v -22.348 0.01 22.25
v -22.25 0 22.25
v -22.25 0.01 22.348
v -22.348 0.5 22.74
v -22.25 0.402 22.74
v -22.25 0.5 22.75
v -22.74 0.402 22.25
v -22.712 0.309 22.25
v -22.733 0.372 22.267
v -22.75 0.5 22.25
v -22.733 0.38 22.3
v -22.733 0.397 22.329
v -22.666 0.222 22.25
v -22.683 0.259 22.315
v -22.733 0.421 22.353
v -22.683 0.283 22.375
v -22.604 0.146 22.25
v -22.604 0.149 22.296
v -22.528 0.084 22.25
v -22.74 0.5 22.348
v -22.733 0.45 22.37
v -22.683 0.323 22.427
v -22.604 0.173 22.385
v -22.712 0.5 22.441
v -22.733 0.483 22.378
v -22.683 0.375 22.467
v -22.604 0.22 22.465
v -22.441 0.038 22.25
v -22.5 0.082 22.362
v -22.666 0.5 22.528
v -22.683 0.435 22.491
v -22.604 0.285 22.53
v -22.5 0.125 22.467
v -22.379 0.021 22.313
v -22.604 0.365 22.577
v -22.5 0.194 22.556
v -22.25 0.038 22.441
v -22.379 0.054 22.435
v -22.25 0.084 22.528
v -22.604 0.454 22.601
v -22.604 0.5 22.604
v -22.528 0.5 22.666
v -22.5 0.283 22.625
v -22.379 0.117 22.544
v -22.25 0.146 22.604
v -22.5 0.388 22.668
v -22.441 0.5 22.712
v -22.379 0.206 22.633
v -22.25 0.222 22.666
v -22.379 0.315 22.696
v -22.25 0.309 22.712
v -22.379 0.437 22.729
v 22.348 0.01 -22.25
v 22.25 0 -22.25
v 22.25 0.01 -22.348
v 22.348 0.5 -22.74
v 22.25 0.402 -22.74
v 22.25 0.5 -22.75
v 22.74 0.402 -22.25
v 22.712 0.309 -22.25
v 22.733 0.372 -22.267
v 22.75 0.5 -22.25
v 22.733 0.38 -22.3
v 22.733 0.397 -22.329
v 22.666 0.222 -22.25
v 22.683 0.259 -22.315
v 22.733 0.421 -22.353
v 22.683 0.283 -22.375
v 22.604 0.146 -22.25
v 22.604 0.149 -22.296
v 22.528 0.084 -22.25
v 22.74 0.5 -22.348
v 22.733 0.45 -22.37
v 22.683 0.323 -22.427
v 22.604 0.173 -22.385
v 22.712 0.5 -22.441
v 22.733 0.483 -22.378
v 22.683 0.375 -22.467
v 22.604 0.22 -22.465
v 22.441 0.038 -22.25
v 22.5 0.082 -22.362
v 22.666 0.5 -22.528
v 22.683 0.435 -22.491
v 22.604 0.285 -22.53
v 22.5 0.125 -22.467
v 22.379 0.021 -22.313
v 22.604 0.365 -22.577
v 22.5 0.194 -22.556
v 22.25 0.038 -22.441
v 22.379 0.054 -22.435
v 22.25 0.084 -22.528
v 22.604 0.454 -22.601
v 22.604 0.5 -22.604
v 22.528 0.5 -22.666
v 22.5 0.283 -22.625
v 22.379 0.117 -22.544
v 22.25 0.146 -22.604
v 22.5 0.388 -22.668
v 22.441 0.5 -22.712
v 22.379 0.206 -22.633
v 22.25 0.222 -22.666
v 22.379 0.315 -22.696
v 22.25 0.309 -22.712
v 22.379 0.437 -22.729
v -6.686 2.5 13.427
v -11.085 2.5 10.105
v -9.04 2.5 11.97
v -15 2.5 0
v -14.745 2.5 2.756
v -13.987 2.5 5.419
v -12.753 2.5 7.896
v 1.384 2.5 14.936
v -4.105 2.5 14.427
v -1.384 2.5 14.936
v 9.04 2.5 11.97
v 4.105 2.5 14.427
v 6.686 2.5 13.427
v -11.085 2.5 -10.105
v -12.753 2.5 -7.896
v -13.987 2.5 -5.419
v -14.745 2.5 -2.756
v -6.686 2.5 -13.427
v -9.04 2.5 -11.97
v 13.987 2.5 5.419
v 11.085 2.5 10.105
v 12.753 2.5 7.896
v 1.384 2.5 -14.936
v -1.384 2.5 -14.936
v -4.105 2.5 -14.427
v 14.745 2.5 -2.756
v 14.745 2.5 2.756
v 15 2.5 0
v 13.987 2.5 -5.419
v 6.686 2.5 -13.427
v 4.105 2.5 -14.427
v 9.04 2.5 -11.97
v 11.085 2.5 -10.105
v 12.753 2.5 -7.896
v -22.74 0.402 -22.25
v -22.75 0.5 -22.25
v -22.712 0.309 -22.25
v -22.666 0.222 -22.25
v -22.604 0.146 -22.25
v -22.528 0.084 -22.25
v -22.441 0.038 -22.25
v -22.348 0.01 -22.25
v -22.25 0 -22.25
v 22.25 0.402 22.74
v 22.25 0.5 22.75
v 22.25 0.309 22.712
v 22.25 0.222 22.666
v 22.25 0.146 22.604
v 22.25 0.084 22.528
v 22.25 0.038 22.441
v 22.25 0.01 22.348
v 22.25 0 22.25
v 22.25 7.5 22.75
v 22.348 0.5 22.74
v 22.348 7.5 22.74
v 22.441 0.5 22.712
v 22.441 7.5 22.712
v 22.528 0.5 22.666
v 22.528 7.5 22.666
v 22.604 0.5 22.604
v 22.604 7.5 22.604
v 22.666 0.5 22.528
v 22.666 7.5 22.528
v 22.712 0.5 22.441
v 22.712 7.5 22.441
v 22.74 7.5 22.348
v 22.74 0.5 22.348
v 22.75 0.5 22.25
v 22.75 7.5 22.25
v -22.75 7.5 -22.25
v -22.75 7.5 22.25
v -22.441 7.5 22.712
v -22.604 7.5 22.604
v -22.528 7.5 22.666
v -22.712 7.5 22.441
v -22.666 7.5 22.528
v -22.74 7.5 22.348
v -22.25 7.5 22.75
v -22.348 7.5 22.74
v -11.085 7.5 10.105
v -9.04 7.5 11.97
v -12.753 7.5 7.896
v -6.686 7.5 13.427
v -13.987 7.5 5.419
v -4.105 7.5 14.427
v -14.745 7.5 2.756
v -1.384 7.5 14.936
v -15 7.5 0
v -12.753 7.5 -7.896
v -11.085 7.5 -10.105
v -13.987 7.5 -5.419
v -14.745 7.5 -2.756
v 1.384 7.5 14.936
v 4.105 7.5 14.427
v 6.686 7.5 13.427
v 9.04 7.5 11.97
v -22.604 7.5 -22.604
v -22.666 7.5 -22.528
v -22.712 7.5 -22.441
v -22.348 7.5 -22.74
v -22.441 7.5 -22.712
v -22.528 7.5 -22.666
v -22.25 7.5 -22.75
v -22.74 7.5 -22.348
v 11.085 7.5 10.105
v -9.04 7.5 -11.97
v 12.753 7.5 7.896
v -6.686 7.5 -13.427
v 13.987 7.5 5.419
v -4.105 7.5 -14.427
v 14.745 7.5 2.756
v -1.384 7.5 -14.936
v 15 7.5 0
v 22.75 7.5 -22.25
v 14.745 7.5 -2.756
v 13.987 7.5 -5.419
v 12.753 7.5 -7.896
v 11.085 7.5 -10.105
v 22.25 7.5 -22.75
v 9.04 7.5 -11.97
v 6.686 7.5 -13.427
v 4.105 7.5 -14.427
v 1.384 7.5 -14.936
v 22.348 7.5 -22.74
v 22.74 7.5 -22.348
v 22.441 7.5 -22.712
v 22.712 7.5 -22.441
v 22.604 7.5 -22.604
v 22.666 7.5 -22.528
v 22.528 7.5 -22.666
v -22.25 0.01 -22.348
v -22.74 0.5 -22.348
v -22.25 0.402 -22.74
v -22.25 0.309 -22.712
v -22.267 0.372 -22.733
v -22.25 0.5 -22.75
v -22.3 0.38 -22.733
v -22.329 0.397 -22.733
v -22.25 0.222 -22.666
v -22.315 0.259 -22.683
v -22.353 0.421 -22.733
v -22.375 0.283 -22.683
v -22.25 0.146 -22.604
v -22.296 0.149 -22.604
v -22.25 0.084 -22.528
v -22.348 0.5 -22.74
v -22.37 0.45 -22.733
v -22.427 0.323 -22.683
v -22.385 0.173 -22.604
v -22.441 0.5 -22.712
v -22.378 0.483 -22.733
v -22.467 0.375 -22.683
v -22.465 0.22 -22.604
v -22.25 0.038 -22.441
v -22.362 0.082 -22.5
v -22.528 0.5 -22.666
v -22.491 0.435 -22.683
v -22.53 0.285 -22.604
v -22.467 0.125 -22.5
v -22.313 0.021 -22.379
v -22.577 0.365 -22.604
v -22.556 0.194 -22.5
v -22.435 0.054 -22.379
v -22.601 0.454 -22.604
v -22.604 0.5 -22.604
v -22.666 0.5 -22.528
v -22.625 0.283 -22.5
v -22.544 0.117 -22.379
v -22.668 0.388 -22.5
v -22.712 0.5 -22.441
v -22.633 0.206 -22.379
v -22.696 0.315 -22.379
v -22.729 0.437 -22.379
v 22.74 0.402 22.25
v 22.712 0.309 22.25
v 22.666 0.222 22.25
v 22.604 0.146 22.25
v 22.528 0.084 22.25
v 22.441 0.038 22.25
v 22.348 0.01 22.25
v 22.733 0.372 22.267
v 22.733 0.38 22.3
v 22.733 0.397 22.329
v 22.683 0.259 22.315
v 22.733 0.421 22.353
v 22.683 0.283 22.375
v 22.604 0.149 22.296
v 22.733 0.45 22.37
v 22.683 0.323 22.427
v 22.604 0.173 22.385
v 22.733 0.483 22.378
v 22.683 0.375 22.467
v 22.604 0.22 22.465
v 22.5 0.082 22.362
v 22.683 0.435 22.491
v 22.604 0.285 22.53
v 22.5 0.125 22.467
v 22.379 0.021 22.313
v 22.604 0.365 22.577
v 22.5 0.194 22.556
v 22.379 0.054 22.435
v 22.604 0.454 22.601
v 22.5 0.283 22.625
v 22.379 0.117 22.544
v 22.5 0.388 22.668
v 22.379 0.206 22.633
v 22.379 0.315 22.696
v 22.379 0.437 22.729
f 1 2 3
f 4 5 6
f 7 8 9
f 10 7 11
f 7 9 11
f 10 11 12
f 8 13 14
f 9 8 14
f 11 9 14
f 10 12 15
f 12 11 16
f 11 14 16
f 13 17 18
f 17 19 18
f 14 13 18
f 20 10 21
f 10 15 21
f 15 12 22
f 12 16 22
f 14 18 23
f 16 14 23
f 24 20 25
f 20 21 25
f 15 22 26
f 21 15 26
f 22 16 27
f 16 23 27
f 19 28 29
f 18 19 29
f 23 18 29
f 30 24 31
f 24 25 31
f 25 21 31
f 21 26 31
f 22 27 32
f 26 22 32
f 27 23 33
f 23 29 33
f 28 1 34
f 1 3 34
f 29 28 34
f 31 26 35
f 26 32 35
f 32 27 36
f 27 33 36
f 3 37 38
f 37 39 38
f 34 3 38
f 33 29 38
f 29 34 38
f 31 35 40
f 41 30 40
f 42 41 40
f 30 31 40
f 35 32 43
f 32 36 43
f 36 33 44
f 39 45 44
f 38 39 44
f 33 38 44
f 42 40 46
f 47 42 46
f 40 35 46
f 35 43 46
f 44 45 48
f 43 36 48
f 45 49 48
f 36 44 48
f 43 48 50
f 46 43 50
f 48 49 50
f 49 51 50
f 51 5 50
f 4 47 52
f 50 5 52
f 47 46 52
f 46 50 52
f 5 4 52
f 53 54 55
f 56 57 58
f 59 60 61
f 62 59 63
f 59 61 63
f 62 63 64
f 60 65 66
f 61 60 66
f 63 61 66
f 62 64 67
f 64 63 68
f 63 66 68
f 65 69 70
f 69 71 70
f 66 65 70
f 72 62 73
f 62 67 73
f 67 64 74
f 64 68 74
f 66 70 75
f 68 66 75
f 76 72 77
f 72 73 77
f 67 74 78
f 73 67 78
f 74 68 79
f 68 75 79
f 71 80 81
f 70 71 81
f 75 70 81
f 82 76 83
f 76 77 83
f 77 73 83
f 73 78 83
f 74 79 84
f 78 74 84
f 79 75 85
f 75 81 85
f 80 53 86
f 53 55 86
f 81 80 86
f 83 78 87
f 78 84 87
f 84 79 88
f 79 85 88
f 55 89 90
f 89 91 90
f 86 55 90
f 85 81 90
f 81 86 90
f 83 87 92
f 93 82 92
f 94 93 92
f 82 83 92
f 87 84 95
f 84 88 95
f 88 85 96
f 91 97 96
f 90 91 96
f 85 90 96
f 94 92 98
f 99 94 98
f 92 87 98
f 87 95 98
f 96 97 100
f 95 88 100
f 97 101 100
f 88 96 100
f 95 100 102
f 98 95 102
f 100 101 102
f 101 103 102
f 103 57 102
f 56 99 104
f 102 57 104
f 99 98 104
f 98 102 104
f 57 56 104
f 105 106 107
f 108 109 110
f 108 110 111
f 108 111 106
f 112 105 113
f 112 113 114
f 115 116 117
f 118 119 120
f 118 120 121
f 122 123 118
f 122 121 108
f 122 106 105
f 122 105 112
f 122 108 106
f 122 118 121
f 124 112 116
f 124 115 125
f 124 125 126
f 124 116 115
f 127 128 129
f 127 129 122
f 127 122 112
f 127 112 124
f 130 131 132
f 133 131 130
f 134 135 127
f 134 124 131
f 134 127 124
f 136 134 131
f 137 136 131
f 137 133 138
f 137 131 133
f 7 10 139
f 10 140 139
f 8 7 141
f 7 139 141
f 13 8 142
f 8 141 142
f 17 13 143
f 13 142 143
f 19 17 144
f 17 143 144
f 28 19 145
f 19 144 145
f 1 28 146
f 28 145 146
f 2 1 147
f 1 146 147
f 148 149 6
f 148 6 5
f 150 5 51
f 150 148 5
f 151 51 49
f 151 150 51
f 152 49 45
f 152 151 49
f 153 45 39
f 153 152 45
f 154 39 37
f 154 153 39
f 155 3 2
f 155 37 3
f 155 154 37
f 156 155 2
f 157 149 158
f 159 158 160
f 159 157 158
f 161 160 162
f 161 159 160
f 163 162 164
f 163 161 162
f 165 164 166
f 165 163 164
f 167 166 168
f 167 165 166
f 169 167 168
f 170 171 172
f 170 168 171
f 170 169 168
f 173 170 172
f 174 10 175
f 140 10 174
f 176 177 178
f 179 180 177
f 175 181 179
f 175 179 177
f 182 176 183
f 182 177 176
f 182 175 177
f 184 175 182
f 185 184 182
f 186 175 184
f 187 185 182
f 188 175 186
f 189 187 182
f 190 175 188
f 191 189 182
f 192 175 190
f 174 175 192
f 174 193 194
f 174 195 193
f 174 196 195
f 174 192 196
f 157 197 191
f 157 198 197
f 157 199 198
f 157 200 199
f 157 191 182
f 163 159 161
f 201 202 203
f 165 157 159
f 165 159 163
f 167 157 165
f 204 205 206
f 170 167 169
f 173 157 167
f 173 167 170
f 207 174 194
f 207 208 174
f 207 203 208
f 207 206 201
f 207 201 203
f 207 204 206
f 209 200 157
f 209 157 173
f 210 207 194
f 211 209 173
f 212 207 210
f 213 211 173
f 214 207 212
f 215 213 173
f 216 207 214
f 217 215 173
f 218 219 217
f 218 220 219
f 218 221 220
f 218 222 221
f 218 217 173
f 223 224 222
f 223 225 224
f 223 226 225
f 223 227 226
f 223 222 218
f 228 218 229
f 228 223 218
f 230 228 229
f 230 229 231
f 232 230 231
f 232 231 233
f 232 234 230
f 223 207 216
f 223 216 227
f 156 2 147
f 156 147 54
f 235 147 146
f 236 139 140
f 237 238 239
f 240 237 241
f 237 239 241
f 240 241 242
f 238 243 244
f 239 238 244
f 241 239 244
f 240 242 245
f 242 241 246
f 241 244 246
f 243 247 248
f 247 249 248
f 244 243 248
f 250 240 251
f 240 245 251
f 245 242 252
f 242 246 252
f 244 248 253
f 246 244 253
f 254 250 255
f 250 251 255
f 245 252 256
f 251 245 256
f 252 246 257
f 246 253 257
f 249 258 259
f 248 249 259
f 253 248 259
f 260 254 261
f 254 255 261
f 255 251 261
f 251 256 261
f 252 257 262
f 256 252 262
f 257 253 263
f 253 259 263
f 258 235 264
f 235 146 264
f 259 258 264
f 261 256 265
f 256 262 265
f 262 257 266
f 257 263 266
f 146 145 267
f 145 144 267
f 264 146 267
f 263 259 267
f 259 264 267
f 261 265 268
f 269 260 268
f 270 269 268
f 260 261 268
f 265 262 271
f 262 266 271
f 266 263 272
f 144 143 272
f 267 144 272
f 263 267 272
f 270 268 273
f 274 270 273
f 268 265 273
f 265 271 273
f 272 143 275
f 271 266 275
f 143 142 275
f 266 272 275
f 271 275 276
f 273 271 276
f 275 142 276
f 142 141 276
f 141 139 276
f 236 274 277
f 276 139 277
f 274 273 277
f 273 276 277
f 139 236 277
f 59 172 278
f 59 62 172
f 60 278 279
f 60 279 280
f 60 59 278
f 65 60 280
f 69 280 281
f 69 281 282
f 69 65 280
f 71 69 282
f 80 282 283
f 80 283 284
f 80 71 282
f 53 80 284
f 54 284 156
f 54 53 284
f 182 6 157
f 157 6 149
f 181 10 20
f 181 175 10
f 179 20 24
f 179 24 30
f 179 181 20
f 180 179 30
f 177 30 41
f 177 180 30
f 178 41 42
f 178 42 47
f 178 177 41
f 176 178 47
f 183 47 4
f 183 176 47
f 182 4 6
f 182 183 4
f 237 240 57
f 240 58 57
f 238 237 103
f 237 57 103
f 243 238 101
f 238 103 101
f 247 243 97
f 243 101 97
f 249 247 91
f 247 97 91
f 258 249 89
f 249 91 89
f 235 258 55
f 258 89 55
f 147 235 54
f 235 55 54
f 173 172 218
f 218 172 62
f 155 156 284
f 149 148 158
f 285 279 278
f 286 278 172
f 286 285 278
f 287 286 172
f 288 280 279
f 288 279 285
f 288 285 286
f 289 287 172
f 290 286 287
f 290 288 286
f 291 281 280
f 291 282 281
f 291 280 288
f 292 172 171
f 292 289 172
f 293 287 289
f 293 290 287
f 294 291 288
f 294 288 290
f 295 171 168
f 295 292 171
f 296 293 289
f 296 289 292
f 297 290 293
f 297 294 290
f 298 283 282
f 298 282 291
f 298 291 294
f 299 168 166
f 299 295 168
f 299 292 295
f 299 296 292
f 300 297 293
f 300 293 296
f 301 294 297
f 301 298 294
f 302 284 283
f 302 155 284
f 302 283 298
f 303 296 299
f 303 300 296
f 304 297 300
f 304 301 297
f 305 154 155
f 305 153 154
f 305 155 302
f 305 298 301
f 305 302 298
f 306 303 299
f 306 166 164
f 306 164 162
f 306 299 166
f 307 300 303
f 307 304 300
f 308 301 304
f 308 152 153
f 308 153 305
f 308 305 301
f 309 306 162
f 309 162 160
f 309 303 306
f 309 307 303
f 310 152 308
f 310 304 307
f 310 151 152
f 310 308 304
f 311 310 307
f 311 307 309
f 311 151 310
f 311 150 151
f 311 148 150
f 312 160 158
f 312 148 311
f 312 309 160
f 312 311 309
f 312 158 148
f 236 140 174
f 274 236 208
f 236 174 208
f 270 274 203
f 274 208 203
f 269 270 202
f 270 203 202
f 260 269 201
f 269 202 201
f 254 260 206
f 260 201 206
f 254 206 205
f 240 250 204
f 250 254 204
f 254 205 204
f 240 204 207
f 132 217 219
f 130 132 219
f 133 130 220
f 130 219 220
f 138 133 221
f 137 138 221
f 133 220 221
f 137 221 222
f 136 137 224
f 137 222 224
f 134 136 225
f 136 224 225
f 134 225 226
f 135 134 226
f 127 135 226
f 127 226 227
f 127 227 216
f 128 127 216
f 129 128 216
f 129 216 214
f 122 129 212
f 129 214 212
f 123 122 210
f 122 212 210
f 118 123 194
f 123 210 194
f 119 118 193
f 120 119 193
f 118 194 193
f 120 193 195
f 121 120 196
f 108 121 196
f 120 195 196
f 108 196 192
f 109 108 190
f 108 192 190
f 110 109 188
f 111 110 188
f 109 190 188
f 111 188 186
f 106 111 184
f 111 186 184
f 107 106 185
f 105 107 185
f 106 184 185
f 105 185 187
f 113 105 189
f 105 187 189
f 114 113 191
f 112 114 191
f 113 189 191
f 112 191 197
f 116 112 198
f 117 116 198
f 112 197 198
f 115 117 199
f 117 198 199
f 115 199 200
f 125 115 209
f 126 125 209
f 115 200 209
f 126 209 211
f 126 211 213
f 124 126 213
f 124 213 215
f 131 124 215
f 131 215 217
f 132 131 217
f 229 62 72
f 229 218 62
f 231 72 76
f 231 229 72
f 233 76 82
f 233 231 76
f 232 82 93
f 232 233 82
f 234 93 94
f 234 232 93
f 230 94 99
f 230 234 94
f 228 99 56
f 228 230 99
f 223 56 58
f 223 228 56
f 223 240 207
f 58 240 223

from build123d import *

# Parameters (mm, degrees)
SKETCH1_W           = 45.5
SKETCH1_H           = 45.5
BOSS_EXTRUDE1_DEPTH = 7.5
FILLET1_R           = 0.5
SKETCH2_R           = 15
CUT_EXTRUDE1_DEPTH  = 5


with BuildPart() as part:
    # Sketch1 → Boss-Extrude1 (new body)
    with BuildSketch(Plane(origin=(0, 0, 0), x_dir=(1, 0, 0), z_dir=(0, 1, 0))):
        Rectangle(SKETCH1_W, SKETCH1_H)
    extrude(amount=BOSS_EXTRUDE1_DEPTH)

    # Fillet1
    fillet1_edges = [part.edges().sort_by_distance(p)[0] for p in [
        (0, 0, 22.75),
        (-22.75, 0, 0),
        (0, 0, -22.75),
        (22.75, 0, 0),
        (22.75, 3.75, 22.75),
        (-22.75, 3.75, 22.75),
        (-22.75, 3.75, -22.75),
        (22.75, 3.75, -22.75),
    ]]
    fillet(fillet1_edges, radius=FILLET1_R)

    # Sketch2 → Cut-Extrude1 (cut)
    with BuildSketch(Plane(origin=(0, 7.5, 0), x_dir=(1, 0, 0), z_dir=(0, 1, 0))):
        Circle(SKETCH2_R)
    extrude(amount=-CUT_EXTRUDE1_DEPTH, mode=Mode.SUBTRACT)


solid = part.part
